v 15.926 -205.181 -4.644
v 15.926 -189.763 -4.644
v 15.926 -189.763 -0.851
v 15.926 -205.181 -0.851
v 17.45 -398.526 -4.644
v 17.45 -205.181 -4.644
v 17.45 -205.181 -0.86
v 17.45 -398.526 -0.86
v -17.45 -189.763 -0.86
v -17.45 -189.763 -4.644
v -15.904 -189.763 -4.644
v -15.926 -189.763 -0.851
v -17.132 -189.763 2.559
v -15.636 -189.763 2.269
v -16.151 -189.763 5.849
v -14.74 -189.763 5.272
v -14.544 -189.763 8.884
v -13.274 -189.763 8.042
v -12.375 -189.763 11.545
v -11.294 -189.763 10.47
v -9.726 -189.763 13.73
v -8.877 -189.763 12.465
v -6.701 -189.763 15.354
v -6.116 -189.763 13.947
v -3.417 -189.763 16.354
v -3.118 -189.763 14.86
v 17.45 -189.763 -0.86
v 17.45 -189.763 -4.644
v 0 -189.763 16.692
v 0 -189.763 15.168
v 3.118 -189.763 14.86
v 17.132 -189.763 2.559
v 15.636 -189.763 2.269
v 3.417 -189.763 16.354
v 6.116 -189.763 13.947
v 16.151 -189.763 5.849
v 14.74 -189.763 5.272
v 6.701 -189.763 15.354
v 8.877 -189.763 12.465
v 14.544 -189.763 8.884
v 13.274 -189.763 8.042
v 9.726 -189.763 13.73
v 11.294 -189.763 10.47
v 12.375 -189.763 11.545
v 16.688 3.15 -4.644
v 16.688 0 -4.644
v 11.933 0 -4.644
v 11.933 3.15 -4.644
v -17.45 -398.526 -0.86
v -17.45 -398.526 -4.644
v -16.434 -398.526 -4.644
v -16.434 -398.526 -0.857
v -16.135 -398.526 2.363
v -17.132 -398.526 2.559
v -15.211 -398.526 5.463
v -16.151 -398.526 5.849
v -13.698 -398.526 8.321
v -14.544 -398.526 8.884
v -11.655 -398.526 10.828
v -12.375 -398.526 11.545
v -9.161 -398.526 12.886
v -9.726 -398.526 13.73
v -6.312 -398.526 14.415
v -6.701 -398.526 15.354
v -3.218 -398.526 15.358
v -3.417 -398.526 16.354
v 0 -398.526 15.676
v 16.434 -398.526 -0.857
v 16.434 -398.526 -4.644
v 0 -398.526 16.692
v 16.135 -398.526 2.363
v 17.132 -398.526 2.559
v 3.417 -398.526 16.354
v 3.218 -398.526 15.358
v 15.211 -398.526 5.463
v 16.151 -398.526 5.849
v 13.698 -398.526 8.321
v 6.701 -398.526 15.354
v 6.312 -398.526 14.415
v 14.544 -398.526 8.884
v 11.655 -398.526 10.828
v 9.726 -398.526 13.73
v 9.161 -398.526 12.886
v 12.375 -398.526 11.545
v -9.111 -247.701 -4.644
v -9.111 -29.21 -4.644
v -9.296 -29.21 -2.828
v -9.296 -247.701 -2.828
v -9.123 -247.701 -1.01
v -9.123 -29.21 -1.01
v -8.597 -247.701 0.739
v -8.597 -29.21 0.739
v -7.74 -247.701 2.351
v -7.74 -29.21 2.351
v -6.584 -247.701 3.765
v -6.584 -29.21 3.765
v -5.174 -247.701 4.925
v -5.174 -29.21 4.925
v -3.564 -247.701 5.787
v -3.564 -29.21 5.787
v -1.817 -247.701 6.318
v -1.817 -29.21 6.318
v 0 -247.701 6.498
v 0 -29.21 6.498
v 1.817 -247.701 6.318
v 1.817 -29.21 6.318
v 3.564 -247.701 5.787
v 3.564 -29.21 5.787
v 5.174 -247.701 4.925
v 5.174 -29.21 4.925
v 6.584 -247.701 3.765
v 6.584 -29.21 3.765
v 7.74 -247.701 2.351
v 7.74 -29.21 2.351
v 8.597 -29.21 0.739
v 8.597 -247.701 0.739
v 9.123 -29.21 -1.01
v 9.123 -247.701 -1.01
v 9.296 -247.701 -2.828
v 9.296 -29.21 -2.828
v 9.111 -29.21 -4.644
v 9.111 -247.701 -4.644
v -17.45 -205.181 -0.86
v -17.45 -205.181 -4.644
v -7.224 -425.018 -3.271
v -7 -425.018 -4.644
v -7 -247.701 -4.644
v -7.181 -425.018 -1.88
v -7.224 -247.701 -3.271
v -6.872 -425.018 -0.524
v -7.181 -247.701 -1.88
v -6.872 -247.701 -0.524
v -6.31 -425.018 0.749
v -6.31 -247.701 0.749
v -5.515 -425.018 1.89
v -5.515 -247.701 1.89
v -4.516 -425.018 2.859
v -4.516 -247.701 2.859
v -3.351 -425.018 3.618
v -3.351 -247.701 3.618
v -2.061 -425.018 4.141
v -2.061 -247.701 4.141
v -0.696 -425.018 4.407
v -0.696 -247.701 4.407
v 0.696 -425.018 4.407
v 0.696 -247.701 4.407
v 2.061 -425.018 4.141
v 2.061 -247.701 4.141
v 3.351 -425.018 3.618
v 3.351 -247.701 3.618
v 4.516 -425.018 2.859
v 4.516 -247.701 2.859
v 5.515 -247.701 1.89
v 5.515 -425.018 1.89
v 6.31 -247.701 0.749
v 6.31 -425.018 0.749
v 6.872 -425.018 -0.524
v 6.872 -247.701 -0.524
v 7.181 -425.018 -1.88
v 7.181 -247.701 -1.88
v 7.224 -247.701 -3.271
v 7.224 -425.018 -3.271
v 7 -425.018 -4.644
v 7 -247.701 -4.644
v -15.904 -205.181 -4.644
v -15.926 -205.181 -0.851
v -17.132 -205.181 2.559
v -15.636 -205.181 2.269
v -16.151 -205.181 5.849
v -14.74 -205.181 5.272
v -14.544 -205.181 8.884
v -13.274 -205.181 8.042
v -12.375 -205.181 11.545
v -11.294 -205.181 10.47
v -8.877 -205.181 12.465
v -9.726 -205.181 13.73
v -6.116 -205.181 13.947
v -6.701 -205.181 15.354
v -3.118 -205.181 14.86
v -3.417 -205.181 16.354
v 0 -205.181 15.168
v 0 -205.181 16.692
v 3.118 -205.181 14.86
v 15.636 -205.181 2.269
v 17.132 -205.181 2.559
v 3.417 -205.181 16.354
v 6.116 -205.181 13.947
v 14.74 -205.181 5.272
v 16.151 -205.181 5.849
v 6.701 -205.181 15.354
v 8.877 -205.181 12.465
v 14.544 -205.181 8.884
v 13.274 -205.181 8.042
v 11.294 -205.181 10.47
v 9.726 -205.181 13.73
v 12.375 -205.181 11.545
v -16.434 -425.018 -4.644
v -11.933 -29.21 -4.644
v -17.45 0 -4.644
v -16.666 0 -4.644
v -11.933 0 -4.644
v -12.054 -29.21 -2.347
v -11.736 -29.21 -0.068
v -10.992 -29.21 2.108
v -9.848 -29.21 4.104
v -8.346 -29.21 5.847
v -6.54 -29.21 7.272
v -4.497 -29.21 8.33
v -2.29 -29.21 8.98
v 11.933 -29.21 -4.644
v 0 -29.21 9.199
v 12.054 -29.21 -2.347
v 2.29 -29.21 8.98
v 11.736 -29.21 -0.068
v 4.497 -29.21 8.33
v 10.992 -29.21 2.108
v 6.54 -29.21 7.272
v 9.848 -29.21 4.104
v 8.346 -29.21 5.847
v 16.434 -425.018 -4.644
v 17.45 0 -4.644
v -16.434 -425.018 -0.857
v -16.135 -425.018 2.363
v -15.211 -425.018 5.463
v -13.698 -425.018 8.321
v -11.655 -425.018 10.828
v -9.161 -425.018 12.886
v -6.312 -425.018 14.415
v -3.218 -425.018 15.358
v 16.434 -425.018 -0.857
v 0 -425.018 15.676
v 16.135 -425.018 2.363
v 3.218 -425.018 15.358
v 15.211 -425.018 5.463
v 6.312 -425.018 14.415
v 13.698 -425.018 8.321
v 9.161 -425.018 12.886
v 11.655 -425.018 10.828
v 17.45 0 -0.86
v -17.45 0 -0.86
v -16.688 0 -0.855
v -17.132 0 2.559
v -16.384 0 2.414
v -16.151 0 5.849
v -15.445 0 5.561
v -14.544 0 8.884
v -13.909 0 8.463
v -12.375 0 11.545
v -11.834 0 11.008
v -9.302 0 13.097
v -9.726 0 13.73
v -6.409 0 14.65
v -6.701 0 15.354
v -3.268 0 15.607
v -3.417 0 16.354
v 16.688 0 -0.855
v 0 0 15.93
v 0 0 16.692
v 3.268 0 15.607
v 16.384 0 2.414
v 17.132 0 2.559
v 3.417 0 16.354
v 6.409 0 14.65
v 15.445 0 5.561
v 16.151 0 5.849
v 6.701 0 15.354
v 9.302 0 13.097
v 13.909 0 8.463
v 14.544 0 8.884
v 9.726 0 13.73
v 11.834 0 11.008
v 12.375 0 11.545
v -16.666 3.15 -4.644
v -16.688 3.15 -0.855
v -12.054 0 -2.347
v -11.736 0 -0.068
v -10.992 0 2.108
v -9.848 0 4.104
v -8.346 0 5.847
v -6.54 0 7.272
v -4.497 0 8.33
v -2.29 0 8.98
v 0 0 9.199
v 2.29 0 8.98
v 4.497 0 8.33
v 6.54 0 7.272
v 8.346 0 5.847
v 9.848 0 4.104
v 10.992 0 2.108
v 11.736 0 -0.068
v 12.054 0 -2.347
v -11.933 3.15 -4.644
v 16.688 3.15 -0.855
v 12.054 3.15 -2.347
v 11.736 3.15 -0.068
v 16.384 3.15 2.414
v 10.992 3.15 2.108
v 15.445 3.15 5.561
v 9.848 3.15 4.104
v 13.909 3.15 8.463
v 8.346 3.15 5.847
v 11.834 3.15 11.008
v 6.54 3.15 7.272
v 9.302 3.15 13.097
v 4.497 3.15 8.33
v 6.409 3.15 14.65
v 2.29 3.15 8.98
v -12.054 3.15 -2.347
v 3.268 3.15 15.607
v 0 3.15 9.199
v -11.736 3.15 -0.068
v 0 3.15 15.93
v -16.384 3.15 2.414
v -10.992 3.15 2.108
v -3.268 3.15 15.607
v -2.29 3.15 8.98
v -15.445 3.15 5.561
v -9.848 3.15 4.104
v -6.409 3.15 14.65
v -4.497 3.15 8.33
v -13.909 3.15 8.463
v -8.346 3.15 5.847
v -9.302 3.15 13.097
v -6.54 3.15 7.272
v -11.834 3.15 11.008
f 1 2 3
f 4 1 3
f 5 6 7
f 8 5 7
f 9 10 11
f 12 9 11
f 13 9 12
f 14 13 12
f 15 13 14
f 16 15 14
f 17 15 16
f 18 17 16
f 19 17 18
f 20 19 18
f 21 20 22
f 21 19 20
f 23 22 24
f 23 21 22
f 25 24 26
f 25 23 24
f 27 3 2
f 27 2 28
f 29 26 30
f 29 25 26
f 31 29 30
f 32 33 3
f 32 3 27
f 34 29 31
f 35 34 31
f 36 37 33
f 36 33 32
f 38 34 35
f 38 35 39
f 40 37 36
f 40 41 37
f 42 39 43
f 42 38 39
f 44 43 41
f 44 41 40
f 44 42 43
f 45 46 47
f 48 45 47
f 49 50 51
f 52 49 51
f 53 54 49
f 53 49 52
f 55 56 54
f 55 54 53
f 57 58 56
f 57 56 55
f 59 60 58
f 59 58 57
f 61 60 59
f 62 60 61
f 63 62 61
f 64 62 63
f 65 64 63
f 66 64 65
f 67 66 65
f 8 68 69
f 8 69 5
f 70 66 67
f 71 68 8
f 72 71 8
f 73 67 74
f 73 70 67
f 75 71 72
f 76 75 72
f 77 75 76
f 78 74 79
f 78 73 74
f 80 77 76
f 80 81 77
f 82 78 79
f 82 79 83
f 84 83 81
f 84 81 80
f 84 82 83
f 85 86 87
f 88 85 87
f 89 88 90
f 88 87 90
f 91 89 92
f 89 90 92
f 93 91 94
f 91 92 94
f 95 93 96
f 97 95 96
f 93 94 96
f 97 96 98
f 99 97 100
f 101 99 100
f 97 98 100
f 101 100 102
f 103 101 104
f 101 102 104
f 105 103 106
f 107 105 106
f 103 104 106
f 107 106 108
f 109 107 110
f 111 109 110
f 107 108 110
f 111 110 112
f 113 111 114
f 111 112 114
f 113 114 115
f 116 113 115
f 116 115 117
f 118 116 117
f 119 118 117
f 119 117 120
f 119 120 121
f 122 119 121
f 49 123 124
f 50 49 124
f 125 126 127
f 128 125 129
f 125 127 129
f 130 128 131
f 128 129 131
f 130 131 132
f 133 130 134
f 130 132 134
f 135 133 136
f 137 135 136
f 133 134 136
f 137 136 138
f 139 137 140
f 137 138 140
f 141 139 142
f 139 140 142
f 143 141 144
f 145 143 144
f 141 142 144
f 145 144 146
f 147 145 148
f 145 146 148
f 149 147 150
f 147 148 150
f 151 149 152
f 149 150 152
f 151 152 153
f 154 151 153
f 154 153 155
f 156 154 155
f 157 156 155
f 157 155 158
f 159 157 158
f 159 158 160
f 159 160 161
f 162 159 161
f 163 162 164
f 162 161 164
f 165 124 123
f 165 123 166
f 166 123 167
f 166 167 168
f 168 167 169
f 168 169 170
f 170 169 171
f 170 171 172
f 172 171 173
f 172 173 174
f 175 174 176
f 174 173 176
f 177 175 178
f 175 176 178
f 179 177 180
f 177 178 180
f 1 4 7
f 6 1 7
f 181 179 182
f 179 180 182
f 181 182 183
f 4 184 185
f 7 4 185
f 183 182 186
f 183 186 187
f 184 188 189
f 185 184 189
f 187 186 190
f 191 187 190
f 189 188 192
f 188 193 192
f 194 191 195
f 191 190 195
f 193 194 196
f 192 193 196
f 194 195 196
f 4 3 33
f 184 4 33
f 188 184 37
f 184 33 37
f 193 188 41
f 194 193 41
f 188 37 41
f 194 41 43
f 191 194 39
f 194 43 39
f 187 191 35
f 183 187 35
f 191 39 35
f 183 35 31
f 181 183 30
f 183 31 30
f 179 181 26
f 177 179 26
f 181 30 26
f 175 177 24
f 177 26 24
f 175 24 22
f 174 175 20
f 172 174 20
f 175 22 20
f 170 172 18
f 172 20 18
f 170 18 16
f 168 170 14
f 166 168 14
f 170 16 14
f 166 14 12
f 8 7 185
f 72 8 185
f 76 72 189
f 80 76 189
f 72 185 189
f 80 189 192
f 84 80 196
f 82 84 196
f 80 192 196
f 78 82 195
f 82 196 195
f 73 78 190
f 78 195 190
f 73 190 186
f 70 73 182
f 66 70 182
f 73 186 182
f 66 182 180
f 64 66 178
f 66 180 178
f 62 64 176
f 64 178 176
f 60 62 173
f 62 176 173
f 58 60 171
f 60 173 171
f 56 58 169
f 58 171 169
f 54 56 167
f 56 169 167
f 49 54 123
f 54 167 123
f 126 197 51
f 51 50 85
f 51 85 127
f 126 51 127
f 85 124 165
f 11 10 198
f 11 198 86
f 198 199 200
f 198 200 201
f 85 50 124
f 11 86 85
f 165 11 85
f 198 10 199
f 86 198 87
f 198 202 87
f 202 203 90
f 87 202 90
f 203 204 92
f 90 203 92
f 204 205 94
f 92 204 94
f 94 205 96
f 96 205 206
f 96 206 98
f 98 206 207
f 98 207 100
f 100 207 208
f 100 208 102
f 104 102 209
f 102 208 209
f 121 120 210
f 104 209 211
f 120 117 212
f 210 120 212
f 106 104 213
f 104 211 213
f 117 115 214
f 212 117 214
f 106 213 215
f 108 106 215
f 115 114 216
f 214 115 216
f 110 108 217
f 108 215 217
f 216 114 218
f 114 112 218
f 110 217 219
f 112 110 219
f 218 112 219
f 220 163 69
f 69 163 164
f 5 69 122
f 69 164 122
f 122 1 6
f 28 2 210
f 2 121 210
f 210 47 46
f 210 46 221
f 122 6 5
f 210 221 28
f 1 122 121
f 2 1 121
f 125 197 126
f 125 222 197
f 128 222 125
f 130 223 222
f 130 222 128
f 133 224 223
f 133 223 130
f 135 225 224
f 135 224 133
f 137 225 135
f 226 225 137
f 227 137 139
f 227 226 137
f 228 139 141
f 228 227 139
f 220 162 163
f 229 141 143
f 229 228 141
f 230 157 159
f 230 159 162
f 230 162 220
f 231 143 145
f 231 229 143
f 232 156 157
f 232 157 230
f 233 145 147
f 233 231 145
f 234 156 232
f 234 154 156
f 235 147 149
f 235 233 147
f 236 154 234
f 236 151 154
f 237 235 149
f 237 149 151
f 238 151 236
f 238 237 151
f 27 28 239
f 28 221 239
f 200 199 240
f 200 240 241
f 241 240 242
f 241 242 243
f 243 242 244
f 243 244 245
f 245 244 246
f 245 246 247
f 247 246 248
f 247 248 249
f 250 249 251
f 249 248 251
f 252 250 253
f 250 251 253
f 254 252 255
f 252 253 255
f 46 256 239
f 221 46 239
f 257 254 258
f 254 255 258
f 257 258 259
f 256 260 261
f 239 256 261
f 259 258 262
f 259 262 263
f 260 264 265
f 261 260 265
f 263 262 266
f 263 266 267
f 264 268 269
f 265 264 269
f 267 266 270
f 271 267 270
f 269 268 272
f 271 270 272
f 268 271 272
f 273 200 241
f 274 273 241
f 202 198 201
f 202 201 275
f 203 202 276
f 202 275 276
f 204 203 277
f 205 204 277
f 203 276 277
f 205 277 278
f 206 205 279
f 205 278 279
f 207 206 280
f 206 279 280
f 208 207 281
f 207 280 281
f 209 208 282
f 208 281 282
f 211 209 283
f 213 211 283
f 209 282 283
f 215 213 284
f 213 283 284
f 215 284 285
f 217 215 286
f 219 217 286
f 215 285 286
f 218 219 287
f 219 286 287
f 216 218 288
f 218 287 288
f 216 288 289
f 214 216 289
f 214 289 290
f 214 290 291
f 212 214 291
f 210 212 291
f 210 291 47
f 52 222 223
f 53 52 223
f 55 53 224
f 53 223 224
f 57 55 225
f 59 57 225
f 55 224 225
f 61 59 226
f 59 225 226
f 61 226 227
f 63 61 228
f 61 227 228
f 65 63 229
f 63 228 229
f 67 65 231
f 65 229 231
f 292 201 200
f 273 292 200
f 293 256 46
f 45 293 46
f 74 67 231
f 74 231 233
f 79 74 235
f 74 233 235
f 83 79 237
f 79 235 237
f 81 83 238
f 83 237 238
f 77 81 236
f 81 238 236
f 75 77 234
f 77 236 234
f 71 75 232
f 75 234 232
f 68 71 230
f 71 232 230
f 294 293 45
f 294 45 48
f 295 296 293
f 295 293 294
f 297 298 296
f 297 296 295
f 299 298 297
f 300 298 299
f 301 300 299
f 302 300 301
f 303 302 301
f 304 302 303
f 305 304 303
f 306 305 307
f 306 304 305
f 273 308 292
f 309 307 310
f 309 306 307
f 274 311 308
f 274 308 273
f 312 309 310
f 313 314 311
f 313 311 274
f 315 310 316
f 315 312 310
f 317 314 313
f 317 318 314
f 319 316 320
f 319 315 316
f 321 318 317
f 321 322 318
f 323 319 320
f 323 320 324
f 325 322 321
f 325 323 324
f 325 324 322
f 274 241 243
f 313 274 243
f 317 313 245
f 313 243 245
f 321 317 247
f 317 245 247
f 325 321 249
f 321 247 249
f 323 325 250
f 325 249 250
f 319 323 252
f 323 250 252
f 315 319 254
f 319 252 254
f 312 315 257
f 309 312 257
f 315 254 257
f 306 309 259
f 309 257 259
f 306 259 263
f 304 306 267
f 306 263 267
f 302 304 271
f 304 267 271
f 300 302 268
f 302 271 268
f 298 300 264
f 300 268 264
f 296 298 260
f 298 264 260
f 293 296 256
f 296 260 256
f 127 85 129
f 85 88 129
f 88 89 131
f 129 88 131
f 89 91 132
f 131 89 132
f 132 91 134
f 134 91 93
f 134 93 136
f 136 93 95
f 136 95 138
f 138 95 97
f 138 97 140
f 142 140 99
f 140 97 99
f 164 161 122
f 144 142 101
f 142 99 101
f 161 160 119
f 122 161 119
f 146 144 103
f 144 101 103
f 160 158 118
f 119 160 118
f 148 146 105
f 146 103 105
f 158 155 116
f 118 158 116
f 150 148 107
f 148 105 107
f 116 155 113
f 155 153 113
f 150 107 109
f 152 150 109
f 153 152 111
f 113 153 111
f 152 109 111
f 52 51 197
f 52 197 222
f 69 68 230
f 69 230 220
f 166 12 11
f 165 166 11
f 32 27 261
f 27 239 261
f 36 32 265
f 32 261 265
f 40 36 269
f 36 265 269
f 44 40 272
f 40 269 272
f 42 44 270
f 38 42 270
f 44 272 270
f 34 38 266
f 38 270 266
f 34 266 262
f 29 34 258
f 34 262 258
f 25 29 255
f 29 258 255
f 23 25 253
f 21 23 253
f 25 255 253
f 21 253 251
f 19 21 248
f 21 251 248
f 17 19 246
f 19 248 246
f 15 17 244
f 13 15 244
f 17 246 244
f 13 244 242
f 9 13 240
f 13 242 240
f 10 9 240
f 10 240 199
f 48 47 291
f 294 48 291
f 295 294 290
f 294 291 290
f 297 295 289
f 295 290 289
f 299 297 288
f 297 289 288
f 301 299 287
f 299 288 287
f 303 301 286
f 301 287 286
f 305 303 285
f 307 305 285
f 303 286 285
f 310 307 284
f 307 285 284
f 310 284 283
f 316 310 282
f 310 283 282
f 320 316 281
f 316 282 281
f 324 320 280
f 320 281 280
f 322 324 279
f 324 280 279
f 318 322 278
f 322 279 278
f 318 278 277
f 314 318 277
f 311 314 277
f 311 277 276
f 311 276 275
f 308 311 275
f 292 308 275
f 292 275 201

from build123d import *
from build123d import SkipClean  # not in build123d's __all__

# Parameters (mm, degrees)
F1_DEPTH  = 29.21
F3_DEPTH  = 160.5534
F5_DEPTH  = 15.4178
F7_DEPTH  = 42.5196
F9_DEPTH  = 177.3174
F11_DEPTH = 26.4922
F13_DEPTH = 3.1496


with BuildPart() as f1:
    # F0 (on Front) → F1 (new body)
    with BuildSketch(Plane.XZ):
        with BuildLine():
            Line((11.9332703397, -4.6441399077), (17.4498, -4.6441399077))
            Line((17.4498, -4.6441399077), (17.4498, -0.8595399077))
            ThreePointArc((17.4498, -0.8595399077), (0, 16.6918600923), (-17.4498, -0.8595399077))
            Line((-17.4498, -0.8595399077), (-17.4498, -4.6441399077))
            Line((-17.4498, -4.6441399077), (-11.9332703397, -4.6441399077))
            ThreePointArc((-11.9332703397, -4.6441399077), (0, 9.1988600923), (11.9332703397, -4.6441399077))
        make_face()
    extrude(amount=F1_DEPTH)

    # F2 (on face) → F3 (join)
    with BuildSketch(Plane.XZ.offset(29.21)):
        with BuildLine():
            ThreePointArc((-9.1113708093, -4.6441399077), (0, 6.4977884545), (9.1113708093, -4.6441399077))
            Line((9.1113708093, -4.6441399077), (11.9332703397, -4.6441399077))
            ThreePointArc((11.9332703397, -4.6441399077), (0, 9.1988600923), (-11.9332703397, -4.6441399077))
            Line((-11.9332703397, -4.6441399077), (-9.1113708093, -4.6441399077))
        make_face()
        with BuildLine():
            ThreePointArc((-11.9332703397, -4.6441399077), (0, 9.1988600923), (11.9332703397, -4.6441399077))
            Line((11.9332703397, -4.6441399077), (17.4498, -4.6441399077))
            Line((17.4498, -4.6441399077), (17.4498, -0.8595399077))
            ThreePointArc((17.4498, -0.8595399077), (0, 16.6918600923), (-17.4498, -0.8595399077))
            Line((-17.4498, -0.8595399077), (-17.4498, -4.6441399077))
            Line((-17.4498, -4.6441399077), (-11.9332703397, -4.6441399077))
        make_face()
    extrude(amount=F3_DEPTH)

    # F4 (on face) → F5 (join)
    with BuildSketch(Plane.XZ.offset(189.7634)):
        with BuildLine():
            Line((15.9258256822, -4.6441399077), (15.9258256822, -0.850692377))
            ThreePointArc((15.9258256822, -0.850692377), (0, 15.1678600923), (-15.9258256822, -0.850692377))
            Line((-15.9258256822, -0.850692377), (-15.9038025792, -4.6441399077))
            Line((-15.9038025792, -4.6441399077), (-9.1113708093, -4.6441399077))
            ThreePointArc((-9.1113708093, -4.6441399077), (0, 6.4977884545), (9.1113708093, -4.6441399077))
            Line((9.1113708093, -4.6441399077), (15.9258256822, -4.6441399077))
        make_face()
    extrude(amount=F5_DEPTH)

    # F6 (on face) → F7 (join)
    with BuildSketch(Plane.XZ.offset(205.1812)):
        with BuildLine():
            ThreePointArc((-9.1113708093, -4.6441399077), (0, 6.4977884545), (9.1113708093, -4.6441399077))
            Line((9.1113708093, -4.6441399077), (15.9258256822, -4.6441399077))
            Line((15.9258256822, -4.6441399077), (15.9258256822, -0.850692377))
            ThreePointArc((15.9258256822, -0.850692377), (0, 15.1678600923), (-15.9258256822, -0.850692377))
            Line((-15.9258256822, -0.850692377), (-15.9038025792, -4.6441399077))
            Line((-15.9038025792, -4.6441399077), (-9.1113708093, -4.6441399077))
        make_face()
        with BuildLine():
            Line((15.9258256822, -0.850692377), (15.9258256822, -4.6441399077))
            Line((15.9258256822, -4.6441399077), (17.4498, -4.6441399077))
            Line((17.4498, -4.6441399077), (17.4498, -0.8595399077))
            ThreePointArc((17.4498, -0.8595399077), (0, 16.6918600923), (-17.4498, -0.8595399077))
            Line((-17.4498, -0.8595399077), (-17.4498, -4.6441399077))
            Line((-17.4498, -4.6441399077), (-15.9038025792, -4.6441399077))
            Line((-15.9038025792, -4.6441399077), (-15.9258256822, -0.850692377))
            ThreePointArc((-15.9258256822, -0.850692377), (0, 15.1678600923), (15.9258256822, -0.850692377))
        make_face()
    extrude(amount=F7_DEPTH)

    # F8 (on face) → F9 (join)
    with BuildSketch(Plane.XZ.offset(247.7008)):
        with BuildLine():
            ThreePointArc((9.1113708093, -4.6441399077), (0, 6.4977884545), (-9.1113708093, -4.6441399077))
            Line((-9.1113708093, -4.6441399077), (-6.9997961445, -4.6441399077))
            ThreePointArc((-6.9997961445, -4.6441399077), (0, 4.4403884545), (6.9997961445, -4.6441399077))
            Line((6.9997961445, -4.6441399077), (9.1113708093, -4.6441399077))
        make_face()
        with BuildLine():
            ThreePointArc((17.4498, -0.8595399077), (0, 16.6918600923), (-17.4498, -0.8595399077))
            Line((-17.4498, -0.8595399077), (-17.4498, -4.6441399077))
            Line((-17.4498, -4.6441399077), (-9.1113708093, -4.6441399077))
            ThreePointArc((-9.1113708093, -4.6441399077), (0, 6.4977884545), (9.1113708093, -4.6441399077))
            Line((9.1113708093, -4.6441399077), (17.4498, -4.6441399077))
            Line((17.4498, -4.6441399077), (17.4498, -0.8595399077))
        make_face()
    extrude(amount=F9_DEPTH)

    # F10 (on face) → F11 (cut)
    with BuildSketch(Plane.XZ.offset(425.0182)):
        with BuildLine():
            ThreePointArc((0, 15.6758600923), (11.6553662483, 10.8276145233), (16.4338, -0.8565464805))
            Line((16.4338, -0.8565464805), (16.4338, -4.6441399077))
            Line((16.4338, -4.6441399077), (17.4498, -4.6441399077))
            Line((17.4498, -4.6441399077), (17.4498, -0.8595399077))
            ThreePointArc((17.4498, -0.8595399077), (0, 16.6918600923), (-17.4498, -0.8595399077))
            Line((-17.4498, -0.8595399077), (-17.4498, -4.6441399077))
            Line((-17.4498, -4.6441399077), (-16.4338, -4.6441399077))
            Line((-16.4338, -4.6441399077), (-16.4338, -0.8565464804))
            ThreePointArc((-16.4338, -0.8565464804), (-11.6553662483, 10.8276145233), (0, 15.6758600923))
        make_face()
    extrude(amount=-F11_DEPTH, mode=Mode.SUBTRACT)

    # F12 (on face) → F13 (join)
    with BuildSketch(Plane(origin=(0, 0, 0), x_dir=(-1, 0, 0), z_dir=(0, 1, 0))):
        with BuildLine():
            ThreePointArc((16.6878128411, -0.8551161423), (0, 15.9298600923), (-16.6878128411, -0.8551161423))
            Line((-16.6878128411, -0.8551161423), (-16.6878128411, -4.6441399077))
            Line((-16.6878128411, -4.6441399077), (-11.9332703397, -4.6441399077))
            ThreePointArc((-11.9332703397, -4.6441399077), (0, 9.1988600923), (11.9332703397, -4.6441399077))
            Line((11.9332703397, -4.6441399077), (16.6658154206, -4.6441399077))
            Line((16.6658154206, -4.6441399077), (16.6878128411, -0.8551161423))
        make_face()
    with SkipClean():  # cleaning this boolean's faces spoils the solid; the shape is the same uncleaned
        extrude(amount=F13_DEPTH)


solid = f1.part
